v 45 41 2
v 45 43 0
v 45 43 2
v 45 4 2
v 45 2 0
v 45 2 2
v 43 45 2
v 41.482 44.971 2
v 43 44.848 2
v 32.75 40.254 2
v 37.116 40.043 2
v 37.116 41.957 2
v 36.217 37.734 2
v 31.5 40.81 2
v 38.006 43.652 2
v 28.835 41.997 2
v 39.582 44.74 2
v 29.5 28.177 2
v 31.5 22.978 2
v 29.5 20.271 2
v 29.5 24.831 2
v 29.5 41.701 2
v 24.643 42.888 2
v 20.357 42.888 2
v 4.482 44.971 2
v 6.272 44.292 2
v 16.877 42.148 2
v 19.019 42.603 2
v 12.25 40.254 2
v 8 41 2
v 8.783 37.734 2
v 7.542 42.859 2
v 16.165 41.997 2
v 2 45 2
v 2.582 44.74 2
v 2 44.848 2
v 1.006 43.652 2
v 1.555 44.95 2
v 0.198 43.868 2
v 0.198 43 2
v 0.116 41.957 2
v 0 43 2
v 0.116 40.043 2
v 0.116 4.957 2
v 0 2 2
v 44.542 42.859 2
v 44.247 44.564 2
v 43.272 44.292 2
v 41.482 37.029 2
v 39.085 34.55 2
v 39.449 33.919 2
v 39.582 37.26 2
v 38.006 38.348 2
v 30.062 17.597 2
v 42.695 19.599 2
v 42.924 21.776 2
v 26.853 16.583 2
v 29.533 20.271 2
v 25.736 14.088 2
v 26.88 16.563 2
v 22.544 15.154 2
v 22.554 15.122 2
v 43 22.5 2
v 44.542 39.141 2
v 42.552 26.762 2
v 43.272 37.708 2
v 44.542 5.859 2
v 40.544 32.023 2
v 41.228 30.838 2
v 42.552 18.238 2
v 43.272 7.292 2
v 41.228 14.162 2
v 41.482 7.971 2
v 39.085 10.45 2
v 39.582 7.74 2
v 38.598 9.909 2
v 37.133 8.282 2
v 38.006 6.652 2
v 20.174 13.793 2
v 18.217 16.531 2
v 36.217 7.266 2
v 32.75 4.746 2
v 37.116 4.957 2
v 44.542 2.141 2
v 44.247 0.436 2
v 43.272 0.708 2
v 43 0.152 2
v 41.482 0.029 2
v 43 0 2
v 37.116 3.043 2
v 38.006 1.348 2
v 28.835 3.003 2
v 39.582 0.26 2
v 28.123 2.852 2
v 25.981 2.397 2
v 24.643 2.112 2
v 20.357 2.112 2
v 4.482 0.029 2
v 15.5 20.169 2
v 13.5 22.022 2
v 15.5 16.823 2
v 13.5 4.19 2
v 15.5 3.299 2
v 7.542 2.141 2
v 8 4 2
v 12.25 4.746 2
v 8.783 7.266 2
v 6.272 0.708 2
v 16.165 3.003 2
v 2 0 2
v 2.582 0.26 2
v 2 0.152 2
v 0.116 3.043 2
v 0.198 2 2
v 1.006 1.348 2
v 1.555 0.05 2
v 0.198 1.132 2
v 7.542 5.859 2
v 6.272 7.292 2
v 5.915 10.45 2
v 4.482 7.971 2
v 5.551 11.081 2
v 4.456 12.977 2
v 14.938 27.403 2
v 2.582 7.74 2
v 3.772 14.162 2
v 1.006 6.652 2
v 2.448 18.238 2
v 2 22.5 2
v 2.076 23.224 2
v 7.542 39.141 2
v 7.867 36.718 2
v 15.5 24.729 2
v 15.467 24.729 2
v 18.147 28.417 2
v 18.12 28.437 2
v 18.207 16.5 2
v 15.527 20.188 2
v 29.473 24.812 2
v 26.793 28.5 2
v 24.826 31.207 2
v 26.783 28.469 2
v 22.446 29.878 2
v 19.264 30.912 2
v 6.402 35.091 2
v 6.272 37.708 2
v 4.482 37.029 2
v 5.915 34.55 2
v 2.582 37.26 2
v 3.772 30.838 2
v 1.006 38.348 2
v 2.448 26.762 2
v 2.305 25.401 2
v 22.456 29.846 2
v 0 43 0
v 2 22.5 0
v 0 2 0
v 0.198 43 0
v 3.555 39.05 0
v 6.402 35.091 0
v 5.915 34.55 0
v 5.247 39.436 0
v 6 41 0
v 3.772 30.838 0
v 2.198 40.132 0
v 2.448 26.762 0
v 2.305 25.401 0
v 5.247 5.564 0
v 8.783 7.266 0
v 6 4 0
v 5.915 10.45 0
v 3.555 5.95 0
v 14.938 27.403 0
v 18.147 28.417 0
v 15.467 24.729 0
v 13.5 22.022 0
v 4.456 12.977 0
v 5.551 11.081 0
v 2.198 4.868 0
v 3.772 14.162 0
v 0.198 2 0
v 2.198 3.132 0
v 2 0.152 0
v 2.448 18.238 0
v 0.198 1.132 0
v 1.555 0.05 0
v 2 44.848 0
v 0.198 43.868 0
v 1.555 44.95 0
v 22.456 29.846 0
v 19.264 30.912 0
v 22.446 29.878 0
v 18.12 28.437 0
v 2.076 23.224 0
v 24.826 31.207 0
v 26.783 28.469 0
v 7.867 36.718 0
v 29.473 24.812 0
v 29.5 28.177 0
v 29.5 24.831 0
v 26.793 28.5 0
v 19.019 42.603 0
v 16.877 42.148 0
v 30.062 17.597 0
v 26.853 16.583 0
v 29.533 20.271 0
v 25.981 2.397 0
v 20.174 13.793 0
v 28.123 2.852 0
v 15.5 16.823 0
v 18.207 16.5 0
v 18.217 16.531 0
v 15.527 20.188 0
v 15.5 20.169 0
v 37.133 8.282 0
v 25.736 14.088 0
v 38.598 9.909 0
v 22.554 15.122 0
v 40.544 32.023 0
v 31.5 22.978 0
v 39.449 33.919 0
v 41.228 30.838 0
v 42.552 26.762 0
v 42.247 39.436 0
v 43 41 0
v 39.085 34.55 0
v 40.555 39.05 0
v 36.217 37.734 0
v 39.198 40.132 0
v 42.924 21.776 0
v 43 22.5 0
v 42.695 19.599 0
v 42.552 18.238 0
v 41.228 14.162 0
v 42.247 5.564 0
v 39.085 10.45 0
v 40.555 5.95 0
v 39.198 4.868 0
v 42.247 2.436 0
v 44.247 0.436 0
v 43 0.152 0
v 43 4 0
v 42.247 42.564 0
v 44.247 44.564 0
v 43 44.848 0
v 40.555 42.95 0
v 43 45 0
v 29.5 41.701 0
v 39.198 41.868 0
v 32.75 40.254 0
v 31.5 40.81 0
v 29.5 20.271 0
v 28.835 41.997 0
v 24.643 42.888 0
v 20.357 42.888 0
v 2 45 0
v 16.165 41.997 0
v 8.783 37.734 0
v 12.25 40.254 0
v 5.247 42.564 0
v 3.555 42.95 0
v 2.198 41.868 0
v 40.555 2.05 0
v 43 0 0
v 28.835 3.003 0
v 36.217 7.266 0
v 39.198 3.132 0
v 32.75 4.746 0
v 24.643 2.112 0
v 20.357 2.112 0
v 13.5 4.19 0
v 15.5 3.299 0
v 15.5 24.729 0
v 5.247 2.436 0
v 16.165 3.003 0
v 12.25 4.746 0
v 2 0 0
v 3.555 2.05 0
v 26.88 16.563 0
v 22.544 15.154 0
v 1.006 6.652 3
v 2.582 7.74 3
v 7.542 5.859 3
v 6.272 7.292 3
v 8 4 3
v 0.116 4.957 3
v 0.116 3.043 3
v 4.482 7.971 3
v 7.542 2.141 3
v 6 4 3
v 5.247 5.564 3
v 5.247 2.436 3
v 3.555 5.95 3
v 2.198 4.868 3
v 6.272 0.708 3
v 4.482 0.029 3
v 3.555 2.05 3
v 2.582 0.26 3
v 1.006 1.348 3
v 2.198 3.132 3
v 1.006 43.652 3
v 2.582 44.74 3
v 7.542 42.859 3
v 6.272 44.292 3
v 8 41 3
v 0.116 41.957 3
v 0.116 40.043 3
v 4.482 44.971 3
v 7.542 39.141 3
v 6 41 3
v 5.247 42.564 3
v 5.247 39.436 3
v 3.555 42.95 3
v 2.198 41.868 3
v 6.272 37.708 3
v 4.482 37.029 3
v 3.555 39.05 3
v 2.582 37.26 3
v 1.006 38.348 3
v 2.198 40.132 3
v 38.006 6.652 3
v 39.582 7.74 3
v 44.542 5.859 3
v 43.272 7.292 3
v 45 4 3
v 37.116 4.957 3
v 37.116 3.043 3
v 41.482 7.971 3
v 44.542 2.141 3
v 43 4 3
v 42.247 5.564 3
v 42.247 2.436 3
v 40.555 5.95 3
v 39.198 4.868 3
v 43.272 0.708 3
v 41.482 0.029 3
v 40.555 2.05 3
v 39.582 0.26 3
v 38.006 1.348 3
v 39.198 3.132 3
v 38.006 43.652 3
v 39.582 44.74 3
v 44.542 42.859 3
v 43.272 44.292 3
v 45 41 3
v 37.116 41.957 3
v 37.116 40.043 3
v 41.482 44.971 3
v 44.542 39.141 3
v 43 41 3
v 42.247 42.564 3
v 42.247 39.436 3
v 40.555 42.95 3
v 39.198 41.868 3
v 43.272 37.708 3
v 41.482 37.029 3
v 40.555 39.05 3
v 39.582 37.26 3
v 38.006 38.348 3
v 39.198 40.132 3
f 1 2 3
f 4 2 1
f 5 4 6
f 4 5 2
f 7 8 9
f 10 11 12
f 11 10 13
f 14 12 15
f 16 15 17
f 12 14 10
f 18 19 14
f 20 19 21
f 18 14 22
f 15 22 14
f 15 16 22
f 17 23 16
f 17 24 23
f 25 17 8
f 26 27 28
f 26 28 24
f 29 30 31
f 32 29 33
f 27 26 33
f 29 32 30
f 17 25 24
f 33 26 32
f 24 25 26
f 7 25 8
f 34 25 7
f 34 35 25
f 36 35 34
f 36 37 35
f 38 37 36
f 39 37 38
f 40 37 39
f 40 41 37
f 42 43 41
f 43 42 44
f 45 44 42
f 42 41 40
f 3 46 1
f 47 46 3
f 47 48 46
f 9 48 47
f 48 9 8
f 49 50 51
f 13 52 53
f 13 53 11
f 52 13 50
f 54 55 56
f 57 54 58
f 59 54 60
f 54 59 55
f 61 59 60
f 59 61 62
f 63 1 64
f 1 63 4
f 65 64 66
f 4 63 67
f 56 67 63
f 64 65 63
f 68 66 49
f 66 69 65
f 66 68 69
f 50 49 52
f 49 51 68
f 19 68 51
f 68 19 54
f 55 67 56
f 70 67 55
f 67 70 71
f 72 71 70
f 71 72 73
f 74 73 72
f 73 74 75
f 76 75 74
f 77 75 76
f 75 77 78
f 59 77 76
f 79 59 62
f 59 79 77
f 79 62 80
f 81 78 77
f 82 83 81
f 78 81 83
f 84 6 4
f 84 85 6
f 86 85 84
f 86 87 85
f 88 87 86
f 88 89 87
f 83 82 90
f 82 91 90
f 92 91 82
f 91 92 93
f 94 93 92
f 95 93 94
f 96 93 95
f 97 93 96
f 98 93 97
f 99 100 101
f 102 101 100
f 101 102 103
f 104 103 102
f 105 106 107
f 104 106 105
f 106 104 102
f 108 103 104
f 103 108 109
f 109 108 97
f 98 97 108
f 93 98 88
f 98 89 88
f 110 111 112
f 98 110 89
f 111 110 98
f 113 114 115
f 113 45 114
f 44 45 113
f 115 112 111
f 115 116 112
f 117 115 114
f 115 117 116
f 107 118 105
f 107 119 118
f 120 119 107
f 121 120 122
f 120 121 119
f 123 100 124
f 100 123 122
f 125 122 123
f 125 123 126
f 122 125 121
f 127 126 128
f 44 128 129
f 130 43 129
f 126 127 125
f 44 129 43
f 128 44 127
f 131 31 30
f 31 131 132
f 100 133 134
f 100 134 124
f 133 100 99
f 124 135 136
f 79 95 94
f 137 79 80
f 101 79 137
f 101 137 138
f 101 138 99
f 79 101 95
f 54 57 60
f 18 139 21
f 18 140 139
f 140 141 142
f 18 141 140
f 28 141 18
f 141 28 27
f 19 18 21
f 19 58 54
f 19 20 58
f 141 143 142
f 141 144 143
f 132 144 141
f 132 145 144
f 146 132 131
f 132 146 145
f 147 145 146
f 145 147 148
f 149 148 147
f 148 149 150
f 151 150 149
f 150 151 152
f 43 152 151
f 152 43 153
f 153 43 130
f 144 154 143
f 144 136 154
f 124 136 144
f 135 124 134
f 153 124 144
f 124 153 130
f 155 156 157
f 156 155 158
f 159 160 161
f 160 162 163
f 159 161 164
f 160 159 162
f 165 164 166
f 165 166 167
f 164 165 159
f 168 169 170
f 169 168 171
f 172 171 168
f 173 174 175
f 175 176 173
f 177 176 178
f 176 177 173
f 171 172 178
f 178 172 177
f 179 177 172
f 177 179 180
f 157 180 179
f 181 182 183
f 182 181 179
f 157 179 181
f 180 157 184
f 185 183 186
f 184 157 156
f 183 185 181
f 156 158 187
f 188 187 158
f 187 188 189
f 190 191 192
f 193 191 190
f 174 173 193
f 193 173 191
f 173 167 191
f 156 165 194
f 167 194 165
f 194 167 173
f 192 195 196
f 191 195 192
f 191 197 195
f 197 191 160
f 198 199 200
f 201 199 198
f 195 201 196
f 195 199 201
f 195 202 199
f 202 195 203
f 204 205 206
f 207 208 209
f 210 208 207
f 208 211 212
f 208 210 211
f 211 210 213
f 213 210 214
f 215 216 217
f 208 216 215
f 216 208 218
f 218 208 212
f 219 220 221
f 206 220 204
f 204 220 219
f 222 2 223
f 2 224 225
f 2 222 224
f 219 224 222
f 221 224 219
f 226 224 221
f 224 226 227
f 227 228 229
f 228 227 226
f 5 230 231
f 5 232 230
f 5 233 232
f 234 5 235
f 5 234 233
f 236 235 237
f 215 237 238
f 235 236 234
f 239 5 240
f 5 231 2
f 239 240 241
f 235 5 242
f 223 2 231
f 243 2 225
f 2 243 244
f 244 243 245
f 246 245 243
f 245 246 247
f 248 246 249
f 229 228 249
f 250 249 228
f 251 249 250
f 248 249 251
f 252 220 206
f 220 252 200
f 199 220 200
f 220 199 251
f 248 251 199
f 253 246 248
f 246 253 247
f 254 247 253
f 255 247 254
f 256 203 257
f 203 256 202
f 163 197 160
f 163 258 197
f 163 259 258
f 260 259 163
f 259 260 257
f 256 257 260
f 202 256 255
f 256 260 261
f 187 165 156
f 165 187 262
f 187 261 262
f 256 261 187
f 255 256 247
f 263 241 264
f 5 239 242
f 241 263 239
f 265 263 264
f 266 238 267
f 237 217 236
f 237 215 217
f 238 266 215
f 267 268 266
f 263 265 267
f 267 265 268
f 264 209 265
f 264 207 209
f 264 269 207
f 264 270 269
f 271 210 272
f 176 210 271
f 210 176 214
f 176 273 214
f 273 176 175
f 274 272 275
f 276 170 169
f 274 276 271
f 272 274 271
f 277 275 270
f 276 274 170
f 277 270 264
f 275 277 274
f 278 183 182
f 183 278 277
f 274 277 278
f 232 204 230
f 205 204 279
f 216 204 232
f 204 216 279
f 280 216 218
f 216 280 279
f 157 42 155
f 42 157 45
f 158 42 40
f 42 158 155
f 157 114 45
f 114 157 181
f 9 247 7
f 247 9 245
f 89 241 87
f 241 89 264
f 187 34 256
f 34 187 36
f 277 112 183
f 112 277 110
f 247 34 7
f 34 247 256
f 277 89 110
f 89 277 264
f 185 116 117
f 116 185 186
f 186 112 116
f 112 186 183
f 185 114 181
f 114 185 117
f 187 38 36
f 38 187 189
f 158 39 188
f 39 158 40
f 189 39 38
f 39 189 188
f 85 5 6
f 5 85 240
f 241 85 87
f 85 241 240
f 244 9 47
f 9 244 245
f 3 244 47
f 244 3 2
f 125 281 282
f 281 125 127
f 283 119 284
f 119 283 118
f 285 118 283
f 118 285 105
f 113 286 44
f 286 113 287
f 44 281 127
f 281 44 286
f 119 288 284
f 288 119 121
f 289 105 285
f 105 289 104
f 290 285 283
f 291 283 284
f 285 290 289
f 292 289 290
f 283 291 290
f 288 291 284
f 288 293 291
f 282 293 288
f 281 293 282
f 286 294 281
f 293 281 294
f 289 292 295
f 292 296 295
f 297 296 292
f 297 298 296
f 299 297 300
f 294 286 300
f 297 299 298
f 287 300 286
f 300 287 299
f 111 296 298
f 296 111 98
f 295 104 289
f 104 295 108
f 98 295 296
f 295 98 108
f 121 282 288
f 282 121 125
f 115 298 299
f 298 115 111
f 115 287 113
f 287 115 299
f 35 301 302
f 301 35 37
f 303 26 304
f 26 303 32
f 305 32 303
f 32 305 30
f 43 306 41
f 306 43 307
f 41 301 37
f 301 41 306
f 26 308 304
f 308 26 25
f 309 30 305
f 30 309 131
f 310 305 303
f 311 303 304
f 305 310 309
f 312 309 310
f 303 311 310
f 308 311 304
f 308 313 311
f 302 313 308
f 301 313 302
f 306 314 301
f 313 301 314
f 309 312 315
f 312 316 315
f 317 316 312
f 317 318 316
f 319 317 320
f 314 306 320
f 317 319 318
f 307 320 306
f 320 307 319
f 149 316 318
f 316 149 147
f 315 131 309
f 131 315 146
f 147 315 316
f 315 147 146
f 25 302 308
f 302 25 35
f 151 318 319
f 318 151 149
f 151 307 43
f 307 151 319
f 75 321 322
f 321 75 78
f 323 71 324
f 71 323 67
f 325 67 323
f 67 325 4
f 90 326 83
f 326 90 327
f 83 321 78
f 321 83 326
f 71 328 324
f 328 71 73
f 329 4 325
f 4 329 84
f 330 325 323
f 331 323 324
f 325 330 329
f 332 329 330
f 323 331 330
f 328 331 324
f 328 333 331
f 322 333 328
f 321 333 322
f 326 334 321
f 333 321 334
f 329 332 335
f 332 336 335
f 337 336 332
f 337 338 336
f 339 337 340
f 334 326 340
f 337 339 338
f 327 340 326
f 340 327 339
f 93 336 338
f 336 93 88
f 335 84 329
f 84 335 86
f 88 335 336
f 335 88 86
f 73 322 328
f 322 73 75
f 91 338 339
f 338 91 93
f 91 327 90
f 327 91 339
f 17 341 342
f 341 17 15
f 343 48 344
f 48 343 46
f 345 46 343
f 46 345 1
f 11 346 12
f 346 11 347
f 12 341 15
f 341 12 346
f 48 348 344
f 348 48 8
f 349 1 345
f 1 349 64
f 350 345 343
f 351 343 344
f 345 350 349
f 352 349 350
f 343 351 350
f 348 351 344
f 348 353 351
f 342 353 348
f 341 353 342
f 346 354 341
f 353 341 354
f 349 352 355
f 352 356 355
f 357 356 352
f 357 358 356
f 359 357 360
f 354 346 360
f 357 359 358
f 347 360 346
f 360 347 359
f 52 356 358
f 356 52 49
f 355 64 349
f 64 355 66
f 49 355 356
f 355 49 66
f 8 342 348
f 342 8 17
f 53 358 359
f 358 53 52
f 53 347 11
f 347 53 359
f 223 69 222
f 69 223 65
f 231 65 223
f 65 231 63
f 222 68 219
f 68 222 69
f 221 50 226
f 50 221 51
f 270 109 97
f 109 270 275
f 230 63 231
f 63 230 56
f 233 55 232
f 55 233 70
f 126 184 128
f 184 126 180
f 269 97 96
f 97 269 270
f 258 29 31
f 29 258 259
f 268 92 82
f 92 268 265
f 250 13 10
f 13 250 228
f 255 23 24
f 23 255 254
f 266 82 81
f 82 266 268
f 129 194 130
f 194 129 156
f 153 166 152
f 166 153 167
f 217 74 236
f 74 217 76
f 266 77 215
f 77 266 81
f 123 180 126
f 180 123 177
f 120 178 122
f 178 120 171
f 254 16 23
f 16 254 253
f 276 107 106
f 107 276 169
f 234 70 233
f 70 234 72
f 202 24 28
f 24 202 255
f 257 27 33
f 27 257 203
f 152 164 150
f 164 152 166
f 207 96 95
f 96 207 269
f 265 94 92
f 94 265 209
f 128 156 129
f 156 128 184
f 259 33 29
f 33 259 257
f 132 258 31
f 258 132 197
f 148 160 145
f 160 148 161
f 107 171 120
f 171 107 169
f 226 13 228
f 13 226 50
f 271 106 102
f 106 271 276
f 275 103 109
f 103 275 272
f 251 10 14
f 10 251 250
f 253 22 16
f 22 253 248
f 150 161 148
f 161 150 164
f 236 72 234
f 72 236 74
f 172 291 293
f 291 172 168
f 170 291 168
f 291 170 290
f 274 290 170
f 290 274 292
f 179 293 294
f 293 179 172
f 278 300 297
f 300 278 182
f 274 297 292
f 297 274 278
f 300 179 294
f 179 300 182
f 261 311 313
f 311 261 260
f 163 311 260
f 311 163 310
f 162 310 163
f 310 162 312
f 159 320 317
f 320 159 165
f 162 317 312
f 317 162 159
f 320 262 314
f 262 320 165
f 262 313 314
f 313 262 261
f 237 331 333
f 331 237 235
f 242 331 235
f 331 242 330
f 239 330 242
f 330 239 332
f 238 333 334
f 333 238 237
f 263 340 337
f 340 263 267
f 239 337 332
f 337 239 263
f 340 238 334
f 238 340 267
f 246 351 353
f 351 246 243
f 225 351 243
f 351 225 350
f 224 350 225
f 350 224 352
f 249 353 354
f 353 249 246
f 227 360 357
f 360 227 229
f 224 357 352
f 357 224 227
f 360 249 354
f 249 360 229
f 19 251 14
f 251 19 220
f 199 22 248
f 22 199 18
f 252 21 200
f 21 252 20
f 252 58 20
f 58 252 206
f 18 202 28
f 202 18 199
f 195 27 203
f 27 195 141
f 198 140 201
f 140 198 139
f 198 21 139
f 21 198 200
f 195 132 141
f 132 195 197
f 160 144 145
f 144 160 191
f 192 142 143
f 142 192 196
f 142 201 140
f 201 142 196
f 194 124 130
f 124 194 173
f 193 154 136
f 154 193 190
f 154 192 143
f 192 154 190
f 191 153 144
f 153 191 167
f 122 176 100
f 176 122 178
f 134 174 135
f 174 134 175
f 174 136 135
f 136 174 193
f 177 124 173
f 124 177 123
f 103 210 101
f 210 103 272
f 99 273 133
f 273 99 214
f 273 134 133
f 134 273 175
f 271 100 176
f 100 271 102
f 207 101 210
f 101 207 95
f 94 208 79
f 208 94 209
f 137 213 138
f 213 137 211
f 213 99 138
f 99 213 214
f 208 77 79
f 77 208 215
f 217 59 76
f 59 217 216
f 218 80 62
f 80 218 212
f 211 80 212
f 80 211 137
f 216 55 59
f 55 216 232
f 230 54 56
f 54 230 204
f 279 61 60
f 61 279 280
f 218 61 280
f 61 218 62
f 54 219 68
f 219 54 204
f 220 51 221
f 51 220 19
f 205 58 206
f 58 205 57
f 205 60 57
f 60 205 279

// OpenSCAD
fan_grill(45);

module fan_grill(size=40) {
// Body Parameters
borderthickness=2;
cornerradius=2;
thickness=2;

dxf=false;

// Screw Hole Parameters
screwradius=4/2;
screwinset=4;

// Spine Parameters
spines=10;
spinesize=2;
spineoffset=7;
spinerotation=0;


// Below are not parameters //

// Calculate helper variables
holeradius=size/2-borderthickness;

// Create the grill
if (dxf)
	projection(cut=false) fan_grill();
else
	fan_grill();

module fan_grill()
{
	union()
	{
		difference()
		{
			body();

			// hole
			translate([size/2,size/2,0]) cylinder(r=holeradius,h=thickness);

			// screws
			#translate([screwinset,screwinset,0]) cylinder(r=screwradius,h=thickness+1);
			translate([screwinset,size-screwinset,0]) cylinder(r=screwradius,h=thickness+1);
			translate([size-screwinset,screwinset,0]) cylinder(r=screwradius,h=thickness+1);
			translate([size-screwinset,size-screwinset,0]) cylinder(r=screwradius,h=thickness+1);
		}
		translate([size/2,size/2,0])
		interrior();
	}
}

module body()
{
	union()
	{
		translate([0,cornerradius,0]) cube(size=[size,size-(cornerradius*2),thickness]);
		translate([cornerradius,0,0]) cube(size=[size-(cornerradius*2),size,thickness]);
		translate([cornerradius,cornerradius,0]) cylinder(r=cornerradius,h=thickness);
		translate([cornerradius,size-cornerradius,0]) cylinder(r=cornerradius,h=thickness);
		translate([size-cornerradius,cornerradius,0]) cylinder(r=cornerradius,h=thickness);
		translate([size-cornerradius,size-cornerradius,0]) cylinder(r=cornerradius,h=thickness);

		#translate([screwinset,screwinset,0]) cylinder(r=screwradius+2,h=thickness+1);
		translate([screwinset,size-screwinset,0]) cylinder(r=screwradius+2,h=thickness+1);
		translate([size-screwinset,screwinset,0]) cylinder(r=screwradius+2,h=thickness+1);
		translate([size-screwinset,size-screwinset,0]) cylinder(r=screwradius+2,h=thickness+1);
	}
}

module interrior()
{
	for(i=[0:spines-1])
	{
		  rotate(a=[0,0,i*(360.0/spines)+spinerotation]) 
		  translate([spineoffset,-spineoffset/3.141,0])
		  cube([spinesize,holeradius+(spineoffset/3.141),thickness]);
	}
}
}
